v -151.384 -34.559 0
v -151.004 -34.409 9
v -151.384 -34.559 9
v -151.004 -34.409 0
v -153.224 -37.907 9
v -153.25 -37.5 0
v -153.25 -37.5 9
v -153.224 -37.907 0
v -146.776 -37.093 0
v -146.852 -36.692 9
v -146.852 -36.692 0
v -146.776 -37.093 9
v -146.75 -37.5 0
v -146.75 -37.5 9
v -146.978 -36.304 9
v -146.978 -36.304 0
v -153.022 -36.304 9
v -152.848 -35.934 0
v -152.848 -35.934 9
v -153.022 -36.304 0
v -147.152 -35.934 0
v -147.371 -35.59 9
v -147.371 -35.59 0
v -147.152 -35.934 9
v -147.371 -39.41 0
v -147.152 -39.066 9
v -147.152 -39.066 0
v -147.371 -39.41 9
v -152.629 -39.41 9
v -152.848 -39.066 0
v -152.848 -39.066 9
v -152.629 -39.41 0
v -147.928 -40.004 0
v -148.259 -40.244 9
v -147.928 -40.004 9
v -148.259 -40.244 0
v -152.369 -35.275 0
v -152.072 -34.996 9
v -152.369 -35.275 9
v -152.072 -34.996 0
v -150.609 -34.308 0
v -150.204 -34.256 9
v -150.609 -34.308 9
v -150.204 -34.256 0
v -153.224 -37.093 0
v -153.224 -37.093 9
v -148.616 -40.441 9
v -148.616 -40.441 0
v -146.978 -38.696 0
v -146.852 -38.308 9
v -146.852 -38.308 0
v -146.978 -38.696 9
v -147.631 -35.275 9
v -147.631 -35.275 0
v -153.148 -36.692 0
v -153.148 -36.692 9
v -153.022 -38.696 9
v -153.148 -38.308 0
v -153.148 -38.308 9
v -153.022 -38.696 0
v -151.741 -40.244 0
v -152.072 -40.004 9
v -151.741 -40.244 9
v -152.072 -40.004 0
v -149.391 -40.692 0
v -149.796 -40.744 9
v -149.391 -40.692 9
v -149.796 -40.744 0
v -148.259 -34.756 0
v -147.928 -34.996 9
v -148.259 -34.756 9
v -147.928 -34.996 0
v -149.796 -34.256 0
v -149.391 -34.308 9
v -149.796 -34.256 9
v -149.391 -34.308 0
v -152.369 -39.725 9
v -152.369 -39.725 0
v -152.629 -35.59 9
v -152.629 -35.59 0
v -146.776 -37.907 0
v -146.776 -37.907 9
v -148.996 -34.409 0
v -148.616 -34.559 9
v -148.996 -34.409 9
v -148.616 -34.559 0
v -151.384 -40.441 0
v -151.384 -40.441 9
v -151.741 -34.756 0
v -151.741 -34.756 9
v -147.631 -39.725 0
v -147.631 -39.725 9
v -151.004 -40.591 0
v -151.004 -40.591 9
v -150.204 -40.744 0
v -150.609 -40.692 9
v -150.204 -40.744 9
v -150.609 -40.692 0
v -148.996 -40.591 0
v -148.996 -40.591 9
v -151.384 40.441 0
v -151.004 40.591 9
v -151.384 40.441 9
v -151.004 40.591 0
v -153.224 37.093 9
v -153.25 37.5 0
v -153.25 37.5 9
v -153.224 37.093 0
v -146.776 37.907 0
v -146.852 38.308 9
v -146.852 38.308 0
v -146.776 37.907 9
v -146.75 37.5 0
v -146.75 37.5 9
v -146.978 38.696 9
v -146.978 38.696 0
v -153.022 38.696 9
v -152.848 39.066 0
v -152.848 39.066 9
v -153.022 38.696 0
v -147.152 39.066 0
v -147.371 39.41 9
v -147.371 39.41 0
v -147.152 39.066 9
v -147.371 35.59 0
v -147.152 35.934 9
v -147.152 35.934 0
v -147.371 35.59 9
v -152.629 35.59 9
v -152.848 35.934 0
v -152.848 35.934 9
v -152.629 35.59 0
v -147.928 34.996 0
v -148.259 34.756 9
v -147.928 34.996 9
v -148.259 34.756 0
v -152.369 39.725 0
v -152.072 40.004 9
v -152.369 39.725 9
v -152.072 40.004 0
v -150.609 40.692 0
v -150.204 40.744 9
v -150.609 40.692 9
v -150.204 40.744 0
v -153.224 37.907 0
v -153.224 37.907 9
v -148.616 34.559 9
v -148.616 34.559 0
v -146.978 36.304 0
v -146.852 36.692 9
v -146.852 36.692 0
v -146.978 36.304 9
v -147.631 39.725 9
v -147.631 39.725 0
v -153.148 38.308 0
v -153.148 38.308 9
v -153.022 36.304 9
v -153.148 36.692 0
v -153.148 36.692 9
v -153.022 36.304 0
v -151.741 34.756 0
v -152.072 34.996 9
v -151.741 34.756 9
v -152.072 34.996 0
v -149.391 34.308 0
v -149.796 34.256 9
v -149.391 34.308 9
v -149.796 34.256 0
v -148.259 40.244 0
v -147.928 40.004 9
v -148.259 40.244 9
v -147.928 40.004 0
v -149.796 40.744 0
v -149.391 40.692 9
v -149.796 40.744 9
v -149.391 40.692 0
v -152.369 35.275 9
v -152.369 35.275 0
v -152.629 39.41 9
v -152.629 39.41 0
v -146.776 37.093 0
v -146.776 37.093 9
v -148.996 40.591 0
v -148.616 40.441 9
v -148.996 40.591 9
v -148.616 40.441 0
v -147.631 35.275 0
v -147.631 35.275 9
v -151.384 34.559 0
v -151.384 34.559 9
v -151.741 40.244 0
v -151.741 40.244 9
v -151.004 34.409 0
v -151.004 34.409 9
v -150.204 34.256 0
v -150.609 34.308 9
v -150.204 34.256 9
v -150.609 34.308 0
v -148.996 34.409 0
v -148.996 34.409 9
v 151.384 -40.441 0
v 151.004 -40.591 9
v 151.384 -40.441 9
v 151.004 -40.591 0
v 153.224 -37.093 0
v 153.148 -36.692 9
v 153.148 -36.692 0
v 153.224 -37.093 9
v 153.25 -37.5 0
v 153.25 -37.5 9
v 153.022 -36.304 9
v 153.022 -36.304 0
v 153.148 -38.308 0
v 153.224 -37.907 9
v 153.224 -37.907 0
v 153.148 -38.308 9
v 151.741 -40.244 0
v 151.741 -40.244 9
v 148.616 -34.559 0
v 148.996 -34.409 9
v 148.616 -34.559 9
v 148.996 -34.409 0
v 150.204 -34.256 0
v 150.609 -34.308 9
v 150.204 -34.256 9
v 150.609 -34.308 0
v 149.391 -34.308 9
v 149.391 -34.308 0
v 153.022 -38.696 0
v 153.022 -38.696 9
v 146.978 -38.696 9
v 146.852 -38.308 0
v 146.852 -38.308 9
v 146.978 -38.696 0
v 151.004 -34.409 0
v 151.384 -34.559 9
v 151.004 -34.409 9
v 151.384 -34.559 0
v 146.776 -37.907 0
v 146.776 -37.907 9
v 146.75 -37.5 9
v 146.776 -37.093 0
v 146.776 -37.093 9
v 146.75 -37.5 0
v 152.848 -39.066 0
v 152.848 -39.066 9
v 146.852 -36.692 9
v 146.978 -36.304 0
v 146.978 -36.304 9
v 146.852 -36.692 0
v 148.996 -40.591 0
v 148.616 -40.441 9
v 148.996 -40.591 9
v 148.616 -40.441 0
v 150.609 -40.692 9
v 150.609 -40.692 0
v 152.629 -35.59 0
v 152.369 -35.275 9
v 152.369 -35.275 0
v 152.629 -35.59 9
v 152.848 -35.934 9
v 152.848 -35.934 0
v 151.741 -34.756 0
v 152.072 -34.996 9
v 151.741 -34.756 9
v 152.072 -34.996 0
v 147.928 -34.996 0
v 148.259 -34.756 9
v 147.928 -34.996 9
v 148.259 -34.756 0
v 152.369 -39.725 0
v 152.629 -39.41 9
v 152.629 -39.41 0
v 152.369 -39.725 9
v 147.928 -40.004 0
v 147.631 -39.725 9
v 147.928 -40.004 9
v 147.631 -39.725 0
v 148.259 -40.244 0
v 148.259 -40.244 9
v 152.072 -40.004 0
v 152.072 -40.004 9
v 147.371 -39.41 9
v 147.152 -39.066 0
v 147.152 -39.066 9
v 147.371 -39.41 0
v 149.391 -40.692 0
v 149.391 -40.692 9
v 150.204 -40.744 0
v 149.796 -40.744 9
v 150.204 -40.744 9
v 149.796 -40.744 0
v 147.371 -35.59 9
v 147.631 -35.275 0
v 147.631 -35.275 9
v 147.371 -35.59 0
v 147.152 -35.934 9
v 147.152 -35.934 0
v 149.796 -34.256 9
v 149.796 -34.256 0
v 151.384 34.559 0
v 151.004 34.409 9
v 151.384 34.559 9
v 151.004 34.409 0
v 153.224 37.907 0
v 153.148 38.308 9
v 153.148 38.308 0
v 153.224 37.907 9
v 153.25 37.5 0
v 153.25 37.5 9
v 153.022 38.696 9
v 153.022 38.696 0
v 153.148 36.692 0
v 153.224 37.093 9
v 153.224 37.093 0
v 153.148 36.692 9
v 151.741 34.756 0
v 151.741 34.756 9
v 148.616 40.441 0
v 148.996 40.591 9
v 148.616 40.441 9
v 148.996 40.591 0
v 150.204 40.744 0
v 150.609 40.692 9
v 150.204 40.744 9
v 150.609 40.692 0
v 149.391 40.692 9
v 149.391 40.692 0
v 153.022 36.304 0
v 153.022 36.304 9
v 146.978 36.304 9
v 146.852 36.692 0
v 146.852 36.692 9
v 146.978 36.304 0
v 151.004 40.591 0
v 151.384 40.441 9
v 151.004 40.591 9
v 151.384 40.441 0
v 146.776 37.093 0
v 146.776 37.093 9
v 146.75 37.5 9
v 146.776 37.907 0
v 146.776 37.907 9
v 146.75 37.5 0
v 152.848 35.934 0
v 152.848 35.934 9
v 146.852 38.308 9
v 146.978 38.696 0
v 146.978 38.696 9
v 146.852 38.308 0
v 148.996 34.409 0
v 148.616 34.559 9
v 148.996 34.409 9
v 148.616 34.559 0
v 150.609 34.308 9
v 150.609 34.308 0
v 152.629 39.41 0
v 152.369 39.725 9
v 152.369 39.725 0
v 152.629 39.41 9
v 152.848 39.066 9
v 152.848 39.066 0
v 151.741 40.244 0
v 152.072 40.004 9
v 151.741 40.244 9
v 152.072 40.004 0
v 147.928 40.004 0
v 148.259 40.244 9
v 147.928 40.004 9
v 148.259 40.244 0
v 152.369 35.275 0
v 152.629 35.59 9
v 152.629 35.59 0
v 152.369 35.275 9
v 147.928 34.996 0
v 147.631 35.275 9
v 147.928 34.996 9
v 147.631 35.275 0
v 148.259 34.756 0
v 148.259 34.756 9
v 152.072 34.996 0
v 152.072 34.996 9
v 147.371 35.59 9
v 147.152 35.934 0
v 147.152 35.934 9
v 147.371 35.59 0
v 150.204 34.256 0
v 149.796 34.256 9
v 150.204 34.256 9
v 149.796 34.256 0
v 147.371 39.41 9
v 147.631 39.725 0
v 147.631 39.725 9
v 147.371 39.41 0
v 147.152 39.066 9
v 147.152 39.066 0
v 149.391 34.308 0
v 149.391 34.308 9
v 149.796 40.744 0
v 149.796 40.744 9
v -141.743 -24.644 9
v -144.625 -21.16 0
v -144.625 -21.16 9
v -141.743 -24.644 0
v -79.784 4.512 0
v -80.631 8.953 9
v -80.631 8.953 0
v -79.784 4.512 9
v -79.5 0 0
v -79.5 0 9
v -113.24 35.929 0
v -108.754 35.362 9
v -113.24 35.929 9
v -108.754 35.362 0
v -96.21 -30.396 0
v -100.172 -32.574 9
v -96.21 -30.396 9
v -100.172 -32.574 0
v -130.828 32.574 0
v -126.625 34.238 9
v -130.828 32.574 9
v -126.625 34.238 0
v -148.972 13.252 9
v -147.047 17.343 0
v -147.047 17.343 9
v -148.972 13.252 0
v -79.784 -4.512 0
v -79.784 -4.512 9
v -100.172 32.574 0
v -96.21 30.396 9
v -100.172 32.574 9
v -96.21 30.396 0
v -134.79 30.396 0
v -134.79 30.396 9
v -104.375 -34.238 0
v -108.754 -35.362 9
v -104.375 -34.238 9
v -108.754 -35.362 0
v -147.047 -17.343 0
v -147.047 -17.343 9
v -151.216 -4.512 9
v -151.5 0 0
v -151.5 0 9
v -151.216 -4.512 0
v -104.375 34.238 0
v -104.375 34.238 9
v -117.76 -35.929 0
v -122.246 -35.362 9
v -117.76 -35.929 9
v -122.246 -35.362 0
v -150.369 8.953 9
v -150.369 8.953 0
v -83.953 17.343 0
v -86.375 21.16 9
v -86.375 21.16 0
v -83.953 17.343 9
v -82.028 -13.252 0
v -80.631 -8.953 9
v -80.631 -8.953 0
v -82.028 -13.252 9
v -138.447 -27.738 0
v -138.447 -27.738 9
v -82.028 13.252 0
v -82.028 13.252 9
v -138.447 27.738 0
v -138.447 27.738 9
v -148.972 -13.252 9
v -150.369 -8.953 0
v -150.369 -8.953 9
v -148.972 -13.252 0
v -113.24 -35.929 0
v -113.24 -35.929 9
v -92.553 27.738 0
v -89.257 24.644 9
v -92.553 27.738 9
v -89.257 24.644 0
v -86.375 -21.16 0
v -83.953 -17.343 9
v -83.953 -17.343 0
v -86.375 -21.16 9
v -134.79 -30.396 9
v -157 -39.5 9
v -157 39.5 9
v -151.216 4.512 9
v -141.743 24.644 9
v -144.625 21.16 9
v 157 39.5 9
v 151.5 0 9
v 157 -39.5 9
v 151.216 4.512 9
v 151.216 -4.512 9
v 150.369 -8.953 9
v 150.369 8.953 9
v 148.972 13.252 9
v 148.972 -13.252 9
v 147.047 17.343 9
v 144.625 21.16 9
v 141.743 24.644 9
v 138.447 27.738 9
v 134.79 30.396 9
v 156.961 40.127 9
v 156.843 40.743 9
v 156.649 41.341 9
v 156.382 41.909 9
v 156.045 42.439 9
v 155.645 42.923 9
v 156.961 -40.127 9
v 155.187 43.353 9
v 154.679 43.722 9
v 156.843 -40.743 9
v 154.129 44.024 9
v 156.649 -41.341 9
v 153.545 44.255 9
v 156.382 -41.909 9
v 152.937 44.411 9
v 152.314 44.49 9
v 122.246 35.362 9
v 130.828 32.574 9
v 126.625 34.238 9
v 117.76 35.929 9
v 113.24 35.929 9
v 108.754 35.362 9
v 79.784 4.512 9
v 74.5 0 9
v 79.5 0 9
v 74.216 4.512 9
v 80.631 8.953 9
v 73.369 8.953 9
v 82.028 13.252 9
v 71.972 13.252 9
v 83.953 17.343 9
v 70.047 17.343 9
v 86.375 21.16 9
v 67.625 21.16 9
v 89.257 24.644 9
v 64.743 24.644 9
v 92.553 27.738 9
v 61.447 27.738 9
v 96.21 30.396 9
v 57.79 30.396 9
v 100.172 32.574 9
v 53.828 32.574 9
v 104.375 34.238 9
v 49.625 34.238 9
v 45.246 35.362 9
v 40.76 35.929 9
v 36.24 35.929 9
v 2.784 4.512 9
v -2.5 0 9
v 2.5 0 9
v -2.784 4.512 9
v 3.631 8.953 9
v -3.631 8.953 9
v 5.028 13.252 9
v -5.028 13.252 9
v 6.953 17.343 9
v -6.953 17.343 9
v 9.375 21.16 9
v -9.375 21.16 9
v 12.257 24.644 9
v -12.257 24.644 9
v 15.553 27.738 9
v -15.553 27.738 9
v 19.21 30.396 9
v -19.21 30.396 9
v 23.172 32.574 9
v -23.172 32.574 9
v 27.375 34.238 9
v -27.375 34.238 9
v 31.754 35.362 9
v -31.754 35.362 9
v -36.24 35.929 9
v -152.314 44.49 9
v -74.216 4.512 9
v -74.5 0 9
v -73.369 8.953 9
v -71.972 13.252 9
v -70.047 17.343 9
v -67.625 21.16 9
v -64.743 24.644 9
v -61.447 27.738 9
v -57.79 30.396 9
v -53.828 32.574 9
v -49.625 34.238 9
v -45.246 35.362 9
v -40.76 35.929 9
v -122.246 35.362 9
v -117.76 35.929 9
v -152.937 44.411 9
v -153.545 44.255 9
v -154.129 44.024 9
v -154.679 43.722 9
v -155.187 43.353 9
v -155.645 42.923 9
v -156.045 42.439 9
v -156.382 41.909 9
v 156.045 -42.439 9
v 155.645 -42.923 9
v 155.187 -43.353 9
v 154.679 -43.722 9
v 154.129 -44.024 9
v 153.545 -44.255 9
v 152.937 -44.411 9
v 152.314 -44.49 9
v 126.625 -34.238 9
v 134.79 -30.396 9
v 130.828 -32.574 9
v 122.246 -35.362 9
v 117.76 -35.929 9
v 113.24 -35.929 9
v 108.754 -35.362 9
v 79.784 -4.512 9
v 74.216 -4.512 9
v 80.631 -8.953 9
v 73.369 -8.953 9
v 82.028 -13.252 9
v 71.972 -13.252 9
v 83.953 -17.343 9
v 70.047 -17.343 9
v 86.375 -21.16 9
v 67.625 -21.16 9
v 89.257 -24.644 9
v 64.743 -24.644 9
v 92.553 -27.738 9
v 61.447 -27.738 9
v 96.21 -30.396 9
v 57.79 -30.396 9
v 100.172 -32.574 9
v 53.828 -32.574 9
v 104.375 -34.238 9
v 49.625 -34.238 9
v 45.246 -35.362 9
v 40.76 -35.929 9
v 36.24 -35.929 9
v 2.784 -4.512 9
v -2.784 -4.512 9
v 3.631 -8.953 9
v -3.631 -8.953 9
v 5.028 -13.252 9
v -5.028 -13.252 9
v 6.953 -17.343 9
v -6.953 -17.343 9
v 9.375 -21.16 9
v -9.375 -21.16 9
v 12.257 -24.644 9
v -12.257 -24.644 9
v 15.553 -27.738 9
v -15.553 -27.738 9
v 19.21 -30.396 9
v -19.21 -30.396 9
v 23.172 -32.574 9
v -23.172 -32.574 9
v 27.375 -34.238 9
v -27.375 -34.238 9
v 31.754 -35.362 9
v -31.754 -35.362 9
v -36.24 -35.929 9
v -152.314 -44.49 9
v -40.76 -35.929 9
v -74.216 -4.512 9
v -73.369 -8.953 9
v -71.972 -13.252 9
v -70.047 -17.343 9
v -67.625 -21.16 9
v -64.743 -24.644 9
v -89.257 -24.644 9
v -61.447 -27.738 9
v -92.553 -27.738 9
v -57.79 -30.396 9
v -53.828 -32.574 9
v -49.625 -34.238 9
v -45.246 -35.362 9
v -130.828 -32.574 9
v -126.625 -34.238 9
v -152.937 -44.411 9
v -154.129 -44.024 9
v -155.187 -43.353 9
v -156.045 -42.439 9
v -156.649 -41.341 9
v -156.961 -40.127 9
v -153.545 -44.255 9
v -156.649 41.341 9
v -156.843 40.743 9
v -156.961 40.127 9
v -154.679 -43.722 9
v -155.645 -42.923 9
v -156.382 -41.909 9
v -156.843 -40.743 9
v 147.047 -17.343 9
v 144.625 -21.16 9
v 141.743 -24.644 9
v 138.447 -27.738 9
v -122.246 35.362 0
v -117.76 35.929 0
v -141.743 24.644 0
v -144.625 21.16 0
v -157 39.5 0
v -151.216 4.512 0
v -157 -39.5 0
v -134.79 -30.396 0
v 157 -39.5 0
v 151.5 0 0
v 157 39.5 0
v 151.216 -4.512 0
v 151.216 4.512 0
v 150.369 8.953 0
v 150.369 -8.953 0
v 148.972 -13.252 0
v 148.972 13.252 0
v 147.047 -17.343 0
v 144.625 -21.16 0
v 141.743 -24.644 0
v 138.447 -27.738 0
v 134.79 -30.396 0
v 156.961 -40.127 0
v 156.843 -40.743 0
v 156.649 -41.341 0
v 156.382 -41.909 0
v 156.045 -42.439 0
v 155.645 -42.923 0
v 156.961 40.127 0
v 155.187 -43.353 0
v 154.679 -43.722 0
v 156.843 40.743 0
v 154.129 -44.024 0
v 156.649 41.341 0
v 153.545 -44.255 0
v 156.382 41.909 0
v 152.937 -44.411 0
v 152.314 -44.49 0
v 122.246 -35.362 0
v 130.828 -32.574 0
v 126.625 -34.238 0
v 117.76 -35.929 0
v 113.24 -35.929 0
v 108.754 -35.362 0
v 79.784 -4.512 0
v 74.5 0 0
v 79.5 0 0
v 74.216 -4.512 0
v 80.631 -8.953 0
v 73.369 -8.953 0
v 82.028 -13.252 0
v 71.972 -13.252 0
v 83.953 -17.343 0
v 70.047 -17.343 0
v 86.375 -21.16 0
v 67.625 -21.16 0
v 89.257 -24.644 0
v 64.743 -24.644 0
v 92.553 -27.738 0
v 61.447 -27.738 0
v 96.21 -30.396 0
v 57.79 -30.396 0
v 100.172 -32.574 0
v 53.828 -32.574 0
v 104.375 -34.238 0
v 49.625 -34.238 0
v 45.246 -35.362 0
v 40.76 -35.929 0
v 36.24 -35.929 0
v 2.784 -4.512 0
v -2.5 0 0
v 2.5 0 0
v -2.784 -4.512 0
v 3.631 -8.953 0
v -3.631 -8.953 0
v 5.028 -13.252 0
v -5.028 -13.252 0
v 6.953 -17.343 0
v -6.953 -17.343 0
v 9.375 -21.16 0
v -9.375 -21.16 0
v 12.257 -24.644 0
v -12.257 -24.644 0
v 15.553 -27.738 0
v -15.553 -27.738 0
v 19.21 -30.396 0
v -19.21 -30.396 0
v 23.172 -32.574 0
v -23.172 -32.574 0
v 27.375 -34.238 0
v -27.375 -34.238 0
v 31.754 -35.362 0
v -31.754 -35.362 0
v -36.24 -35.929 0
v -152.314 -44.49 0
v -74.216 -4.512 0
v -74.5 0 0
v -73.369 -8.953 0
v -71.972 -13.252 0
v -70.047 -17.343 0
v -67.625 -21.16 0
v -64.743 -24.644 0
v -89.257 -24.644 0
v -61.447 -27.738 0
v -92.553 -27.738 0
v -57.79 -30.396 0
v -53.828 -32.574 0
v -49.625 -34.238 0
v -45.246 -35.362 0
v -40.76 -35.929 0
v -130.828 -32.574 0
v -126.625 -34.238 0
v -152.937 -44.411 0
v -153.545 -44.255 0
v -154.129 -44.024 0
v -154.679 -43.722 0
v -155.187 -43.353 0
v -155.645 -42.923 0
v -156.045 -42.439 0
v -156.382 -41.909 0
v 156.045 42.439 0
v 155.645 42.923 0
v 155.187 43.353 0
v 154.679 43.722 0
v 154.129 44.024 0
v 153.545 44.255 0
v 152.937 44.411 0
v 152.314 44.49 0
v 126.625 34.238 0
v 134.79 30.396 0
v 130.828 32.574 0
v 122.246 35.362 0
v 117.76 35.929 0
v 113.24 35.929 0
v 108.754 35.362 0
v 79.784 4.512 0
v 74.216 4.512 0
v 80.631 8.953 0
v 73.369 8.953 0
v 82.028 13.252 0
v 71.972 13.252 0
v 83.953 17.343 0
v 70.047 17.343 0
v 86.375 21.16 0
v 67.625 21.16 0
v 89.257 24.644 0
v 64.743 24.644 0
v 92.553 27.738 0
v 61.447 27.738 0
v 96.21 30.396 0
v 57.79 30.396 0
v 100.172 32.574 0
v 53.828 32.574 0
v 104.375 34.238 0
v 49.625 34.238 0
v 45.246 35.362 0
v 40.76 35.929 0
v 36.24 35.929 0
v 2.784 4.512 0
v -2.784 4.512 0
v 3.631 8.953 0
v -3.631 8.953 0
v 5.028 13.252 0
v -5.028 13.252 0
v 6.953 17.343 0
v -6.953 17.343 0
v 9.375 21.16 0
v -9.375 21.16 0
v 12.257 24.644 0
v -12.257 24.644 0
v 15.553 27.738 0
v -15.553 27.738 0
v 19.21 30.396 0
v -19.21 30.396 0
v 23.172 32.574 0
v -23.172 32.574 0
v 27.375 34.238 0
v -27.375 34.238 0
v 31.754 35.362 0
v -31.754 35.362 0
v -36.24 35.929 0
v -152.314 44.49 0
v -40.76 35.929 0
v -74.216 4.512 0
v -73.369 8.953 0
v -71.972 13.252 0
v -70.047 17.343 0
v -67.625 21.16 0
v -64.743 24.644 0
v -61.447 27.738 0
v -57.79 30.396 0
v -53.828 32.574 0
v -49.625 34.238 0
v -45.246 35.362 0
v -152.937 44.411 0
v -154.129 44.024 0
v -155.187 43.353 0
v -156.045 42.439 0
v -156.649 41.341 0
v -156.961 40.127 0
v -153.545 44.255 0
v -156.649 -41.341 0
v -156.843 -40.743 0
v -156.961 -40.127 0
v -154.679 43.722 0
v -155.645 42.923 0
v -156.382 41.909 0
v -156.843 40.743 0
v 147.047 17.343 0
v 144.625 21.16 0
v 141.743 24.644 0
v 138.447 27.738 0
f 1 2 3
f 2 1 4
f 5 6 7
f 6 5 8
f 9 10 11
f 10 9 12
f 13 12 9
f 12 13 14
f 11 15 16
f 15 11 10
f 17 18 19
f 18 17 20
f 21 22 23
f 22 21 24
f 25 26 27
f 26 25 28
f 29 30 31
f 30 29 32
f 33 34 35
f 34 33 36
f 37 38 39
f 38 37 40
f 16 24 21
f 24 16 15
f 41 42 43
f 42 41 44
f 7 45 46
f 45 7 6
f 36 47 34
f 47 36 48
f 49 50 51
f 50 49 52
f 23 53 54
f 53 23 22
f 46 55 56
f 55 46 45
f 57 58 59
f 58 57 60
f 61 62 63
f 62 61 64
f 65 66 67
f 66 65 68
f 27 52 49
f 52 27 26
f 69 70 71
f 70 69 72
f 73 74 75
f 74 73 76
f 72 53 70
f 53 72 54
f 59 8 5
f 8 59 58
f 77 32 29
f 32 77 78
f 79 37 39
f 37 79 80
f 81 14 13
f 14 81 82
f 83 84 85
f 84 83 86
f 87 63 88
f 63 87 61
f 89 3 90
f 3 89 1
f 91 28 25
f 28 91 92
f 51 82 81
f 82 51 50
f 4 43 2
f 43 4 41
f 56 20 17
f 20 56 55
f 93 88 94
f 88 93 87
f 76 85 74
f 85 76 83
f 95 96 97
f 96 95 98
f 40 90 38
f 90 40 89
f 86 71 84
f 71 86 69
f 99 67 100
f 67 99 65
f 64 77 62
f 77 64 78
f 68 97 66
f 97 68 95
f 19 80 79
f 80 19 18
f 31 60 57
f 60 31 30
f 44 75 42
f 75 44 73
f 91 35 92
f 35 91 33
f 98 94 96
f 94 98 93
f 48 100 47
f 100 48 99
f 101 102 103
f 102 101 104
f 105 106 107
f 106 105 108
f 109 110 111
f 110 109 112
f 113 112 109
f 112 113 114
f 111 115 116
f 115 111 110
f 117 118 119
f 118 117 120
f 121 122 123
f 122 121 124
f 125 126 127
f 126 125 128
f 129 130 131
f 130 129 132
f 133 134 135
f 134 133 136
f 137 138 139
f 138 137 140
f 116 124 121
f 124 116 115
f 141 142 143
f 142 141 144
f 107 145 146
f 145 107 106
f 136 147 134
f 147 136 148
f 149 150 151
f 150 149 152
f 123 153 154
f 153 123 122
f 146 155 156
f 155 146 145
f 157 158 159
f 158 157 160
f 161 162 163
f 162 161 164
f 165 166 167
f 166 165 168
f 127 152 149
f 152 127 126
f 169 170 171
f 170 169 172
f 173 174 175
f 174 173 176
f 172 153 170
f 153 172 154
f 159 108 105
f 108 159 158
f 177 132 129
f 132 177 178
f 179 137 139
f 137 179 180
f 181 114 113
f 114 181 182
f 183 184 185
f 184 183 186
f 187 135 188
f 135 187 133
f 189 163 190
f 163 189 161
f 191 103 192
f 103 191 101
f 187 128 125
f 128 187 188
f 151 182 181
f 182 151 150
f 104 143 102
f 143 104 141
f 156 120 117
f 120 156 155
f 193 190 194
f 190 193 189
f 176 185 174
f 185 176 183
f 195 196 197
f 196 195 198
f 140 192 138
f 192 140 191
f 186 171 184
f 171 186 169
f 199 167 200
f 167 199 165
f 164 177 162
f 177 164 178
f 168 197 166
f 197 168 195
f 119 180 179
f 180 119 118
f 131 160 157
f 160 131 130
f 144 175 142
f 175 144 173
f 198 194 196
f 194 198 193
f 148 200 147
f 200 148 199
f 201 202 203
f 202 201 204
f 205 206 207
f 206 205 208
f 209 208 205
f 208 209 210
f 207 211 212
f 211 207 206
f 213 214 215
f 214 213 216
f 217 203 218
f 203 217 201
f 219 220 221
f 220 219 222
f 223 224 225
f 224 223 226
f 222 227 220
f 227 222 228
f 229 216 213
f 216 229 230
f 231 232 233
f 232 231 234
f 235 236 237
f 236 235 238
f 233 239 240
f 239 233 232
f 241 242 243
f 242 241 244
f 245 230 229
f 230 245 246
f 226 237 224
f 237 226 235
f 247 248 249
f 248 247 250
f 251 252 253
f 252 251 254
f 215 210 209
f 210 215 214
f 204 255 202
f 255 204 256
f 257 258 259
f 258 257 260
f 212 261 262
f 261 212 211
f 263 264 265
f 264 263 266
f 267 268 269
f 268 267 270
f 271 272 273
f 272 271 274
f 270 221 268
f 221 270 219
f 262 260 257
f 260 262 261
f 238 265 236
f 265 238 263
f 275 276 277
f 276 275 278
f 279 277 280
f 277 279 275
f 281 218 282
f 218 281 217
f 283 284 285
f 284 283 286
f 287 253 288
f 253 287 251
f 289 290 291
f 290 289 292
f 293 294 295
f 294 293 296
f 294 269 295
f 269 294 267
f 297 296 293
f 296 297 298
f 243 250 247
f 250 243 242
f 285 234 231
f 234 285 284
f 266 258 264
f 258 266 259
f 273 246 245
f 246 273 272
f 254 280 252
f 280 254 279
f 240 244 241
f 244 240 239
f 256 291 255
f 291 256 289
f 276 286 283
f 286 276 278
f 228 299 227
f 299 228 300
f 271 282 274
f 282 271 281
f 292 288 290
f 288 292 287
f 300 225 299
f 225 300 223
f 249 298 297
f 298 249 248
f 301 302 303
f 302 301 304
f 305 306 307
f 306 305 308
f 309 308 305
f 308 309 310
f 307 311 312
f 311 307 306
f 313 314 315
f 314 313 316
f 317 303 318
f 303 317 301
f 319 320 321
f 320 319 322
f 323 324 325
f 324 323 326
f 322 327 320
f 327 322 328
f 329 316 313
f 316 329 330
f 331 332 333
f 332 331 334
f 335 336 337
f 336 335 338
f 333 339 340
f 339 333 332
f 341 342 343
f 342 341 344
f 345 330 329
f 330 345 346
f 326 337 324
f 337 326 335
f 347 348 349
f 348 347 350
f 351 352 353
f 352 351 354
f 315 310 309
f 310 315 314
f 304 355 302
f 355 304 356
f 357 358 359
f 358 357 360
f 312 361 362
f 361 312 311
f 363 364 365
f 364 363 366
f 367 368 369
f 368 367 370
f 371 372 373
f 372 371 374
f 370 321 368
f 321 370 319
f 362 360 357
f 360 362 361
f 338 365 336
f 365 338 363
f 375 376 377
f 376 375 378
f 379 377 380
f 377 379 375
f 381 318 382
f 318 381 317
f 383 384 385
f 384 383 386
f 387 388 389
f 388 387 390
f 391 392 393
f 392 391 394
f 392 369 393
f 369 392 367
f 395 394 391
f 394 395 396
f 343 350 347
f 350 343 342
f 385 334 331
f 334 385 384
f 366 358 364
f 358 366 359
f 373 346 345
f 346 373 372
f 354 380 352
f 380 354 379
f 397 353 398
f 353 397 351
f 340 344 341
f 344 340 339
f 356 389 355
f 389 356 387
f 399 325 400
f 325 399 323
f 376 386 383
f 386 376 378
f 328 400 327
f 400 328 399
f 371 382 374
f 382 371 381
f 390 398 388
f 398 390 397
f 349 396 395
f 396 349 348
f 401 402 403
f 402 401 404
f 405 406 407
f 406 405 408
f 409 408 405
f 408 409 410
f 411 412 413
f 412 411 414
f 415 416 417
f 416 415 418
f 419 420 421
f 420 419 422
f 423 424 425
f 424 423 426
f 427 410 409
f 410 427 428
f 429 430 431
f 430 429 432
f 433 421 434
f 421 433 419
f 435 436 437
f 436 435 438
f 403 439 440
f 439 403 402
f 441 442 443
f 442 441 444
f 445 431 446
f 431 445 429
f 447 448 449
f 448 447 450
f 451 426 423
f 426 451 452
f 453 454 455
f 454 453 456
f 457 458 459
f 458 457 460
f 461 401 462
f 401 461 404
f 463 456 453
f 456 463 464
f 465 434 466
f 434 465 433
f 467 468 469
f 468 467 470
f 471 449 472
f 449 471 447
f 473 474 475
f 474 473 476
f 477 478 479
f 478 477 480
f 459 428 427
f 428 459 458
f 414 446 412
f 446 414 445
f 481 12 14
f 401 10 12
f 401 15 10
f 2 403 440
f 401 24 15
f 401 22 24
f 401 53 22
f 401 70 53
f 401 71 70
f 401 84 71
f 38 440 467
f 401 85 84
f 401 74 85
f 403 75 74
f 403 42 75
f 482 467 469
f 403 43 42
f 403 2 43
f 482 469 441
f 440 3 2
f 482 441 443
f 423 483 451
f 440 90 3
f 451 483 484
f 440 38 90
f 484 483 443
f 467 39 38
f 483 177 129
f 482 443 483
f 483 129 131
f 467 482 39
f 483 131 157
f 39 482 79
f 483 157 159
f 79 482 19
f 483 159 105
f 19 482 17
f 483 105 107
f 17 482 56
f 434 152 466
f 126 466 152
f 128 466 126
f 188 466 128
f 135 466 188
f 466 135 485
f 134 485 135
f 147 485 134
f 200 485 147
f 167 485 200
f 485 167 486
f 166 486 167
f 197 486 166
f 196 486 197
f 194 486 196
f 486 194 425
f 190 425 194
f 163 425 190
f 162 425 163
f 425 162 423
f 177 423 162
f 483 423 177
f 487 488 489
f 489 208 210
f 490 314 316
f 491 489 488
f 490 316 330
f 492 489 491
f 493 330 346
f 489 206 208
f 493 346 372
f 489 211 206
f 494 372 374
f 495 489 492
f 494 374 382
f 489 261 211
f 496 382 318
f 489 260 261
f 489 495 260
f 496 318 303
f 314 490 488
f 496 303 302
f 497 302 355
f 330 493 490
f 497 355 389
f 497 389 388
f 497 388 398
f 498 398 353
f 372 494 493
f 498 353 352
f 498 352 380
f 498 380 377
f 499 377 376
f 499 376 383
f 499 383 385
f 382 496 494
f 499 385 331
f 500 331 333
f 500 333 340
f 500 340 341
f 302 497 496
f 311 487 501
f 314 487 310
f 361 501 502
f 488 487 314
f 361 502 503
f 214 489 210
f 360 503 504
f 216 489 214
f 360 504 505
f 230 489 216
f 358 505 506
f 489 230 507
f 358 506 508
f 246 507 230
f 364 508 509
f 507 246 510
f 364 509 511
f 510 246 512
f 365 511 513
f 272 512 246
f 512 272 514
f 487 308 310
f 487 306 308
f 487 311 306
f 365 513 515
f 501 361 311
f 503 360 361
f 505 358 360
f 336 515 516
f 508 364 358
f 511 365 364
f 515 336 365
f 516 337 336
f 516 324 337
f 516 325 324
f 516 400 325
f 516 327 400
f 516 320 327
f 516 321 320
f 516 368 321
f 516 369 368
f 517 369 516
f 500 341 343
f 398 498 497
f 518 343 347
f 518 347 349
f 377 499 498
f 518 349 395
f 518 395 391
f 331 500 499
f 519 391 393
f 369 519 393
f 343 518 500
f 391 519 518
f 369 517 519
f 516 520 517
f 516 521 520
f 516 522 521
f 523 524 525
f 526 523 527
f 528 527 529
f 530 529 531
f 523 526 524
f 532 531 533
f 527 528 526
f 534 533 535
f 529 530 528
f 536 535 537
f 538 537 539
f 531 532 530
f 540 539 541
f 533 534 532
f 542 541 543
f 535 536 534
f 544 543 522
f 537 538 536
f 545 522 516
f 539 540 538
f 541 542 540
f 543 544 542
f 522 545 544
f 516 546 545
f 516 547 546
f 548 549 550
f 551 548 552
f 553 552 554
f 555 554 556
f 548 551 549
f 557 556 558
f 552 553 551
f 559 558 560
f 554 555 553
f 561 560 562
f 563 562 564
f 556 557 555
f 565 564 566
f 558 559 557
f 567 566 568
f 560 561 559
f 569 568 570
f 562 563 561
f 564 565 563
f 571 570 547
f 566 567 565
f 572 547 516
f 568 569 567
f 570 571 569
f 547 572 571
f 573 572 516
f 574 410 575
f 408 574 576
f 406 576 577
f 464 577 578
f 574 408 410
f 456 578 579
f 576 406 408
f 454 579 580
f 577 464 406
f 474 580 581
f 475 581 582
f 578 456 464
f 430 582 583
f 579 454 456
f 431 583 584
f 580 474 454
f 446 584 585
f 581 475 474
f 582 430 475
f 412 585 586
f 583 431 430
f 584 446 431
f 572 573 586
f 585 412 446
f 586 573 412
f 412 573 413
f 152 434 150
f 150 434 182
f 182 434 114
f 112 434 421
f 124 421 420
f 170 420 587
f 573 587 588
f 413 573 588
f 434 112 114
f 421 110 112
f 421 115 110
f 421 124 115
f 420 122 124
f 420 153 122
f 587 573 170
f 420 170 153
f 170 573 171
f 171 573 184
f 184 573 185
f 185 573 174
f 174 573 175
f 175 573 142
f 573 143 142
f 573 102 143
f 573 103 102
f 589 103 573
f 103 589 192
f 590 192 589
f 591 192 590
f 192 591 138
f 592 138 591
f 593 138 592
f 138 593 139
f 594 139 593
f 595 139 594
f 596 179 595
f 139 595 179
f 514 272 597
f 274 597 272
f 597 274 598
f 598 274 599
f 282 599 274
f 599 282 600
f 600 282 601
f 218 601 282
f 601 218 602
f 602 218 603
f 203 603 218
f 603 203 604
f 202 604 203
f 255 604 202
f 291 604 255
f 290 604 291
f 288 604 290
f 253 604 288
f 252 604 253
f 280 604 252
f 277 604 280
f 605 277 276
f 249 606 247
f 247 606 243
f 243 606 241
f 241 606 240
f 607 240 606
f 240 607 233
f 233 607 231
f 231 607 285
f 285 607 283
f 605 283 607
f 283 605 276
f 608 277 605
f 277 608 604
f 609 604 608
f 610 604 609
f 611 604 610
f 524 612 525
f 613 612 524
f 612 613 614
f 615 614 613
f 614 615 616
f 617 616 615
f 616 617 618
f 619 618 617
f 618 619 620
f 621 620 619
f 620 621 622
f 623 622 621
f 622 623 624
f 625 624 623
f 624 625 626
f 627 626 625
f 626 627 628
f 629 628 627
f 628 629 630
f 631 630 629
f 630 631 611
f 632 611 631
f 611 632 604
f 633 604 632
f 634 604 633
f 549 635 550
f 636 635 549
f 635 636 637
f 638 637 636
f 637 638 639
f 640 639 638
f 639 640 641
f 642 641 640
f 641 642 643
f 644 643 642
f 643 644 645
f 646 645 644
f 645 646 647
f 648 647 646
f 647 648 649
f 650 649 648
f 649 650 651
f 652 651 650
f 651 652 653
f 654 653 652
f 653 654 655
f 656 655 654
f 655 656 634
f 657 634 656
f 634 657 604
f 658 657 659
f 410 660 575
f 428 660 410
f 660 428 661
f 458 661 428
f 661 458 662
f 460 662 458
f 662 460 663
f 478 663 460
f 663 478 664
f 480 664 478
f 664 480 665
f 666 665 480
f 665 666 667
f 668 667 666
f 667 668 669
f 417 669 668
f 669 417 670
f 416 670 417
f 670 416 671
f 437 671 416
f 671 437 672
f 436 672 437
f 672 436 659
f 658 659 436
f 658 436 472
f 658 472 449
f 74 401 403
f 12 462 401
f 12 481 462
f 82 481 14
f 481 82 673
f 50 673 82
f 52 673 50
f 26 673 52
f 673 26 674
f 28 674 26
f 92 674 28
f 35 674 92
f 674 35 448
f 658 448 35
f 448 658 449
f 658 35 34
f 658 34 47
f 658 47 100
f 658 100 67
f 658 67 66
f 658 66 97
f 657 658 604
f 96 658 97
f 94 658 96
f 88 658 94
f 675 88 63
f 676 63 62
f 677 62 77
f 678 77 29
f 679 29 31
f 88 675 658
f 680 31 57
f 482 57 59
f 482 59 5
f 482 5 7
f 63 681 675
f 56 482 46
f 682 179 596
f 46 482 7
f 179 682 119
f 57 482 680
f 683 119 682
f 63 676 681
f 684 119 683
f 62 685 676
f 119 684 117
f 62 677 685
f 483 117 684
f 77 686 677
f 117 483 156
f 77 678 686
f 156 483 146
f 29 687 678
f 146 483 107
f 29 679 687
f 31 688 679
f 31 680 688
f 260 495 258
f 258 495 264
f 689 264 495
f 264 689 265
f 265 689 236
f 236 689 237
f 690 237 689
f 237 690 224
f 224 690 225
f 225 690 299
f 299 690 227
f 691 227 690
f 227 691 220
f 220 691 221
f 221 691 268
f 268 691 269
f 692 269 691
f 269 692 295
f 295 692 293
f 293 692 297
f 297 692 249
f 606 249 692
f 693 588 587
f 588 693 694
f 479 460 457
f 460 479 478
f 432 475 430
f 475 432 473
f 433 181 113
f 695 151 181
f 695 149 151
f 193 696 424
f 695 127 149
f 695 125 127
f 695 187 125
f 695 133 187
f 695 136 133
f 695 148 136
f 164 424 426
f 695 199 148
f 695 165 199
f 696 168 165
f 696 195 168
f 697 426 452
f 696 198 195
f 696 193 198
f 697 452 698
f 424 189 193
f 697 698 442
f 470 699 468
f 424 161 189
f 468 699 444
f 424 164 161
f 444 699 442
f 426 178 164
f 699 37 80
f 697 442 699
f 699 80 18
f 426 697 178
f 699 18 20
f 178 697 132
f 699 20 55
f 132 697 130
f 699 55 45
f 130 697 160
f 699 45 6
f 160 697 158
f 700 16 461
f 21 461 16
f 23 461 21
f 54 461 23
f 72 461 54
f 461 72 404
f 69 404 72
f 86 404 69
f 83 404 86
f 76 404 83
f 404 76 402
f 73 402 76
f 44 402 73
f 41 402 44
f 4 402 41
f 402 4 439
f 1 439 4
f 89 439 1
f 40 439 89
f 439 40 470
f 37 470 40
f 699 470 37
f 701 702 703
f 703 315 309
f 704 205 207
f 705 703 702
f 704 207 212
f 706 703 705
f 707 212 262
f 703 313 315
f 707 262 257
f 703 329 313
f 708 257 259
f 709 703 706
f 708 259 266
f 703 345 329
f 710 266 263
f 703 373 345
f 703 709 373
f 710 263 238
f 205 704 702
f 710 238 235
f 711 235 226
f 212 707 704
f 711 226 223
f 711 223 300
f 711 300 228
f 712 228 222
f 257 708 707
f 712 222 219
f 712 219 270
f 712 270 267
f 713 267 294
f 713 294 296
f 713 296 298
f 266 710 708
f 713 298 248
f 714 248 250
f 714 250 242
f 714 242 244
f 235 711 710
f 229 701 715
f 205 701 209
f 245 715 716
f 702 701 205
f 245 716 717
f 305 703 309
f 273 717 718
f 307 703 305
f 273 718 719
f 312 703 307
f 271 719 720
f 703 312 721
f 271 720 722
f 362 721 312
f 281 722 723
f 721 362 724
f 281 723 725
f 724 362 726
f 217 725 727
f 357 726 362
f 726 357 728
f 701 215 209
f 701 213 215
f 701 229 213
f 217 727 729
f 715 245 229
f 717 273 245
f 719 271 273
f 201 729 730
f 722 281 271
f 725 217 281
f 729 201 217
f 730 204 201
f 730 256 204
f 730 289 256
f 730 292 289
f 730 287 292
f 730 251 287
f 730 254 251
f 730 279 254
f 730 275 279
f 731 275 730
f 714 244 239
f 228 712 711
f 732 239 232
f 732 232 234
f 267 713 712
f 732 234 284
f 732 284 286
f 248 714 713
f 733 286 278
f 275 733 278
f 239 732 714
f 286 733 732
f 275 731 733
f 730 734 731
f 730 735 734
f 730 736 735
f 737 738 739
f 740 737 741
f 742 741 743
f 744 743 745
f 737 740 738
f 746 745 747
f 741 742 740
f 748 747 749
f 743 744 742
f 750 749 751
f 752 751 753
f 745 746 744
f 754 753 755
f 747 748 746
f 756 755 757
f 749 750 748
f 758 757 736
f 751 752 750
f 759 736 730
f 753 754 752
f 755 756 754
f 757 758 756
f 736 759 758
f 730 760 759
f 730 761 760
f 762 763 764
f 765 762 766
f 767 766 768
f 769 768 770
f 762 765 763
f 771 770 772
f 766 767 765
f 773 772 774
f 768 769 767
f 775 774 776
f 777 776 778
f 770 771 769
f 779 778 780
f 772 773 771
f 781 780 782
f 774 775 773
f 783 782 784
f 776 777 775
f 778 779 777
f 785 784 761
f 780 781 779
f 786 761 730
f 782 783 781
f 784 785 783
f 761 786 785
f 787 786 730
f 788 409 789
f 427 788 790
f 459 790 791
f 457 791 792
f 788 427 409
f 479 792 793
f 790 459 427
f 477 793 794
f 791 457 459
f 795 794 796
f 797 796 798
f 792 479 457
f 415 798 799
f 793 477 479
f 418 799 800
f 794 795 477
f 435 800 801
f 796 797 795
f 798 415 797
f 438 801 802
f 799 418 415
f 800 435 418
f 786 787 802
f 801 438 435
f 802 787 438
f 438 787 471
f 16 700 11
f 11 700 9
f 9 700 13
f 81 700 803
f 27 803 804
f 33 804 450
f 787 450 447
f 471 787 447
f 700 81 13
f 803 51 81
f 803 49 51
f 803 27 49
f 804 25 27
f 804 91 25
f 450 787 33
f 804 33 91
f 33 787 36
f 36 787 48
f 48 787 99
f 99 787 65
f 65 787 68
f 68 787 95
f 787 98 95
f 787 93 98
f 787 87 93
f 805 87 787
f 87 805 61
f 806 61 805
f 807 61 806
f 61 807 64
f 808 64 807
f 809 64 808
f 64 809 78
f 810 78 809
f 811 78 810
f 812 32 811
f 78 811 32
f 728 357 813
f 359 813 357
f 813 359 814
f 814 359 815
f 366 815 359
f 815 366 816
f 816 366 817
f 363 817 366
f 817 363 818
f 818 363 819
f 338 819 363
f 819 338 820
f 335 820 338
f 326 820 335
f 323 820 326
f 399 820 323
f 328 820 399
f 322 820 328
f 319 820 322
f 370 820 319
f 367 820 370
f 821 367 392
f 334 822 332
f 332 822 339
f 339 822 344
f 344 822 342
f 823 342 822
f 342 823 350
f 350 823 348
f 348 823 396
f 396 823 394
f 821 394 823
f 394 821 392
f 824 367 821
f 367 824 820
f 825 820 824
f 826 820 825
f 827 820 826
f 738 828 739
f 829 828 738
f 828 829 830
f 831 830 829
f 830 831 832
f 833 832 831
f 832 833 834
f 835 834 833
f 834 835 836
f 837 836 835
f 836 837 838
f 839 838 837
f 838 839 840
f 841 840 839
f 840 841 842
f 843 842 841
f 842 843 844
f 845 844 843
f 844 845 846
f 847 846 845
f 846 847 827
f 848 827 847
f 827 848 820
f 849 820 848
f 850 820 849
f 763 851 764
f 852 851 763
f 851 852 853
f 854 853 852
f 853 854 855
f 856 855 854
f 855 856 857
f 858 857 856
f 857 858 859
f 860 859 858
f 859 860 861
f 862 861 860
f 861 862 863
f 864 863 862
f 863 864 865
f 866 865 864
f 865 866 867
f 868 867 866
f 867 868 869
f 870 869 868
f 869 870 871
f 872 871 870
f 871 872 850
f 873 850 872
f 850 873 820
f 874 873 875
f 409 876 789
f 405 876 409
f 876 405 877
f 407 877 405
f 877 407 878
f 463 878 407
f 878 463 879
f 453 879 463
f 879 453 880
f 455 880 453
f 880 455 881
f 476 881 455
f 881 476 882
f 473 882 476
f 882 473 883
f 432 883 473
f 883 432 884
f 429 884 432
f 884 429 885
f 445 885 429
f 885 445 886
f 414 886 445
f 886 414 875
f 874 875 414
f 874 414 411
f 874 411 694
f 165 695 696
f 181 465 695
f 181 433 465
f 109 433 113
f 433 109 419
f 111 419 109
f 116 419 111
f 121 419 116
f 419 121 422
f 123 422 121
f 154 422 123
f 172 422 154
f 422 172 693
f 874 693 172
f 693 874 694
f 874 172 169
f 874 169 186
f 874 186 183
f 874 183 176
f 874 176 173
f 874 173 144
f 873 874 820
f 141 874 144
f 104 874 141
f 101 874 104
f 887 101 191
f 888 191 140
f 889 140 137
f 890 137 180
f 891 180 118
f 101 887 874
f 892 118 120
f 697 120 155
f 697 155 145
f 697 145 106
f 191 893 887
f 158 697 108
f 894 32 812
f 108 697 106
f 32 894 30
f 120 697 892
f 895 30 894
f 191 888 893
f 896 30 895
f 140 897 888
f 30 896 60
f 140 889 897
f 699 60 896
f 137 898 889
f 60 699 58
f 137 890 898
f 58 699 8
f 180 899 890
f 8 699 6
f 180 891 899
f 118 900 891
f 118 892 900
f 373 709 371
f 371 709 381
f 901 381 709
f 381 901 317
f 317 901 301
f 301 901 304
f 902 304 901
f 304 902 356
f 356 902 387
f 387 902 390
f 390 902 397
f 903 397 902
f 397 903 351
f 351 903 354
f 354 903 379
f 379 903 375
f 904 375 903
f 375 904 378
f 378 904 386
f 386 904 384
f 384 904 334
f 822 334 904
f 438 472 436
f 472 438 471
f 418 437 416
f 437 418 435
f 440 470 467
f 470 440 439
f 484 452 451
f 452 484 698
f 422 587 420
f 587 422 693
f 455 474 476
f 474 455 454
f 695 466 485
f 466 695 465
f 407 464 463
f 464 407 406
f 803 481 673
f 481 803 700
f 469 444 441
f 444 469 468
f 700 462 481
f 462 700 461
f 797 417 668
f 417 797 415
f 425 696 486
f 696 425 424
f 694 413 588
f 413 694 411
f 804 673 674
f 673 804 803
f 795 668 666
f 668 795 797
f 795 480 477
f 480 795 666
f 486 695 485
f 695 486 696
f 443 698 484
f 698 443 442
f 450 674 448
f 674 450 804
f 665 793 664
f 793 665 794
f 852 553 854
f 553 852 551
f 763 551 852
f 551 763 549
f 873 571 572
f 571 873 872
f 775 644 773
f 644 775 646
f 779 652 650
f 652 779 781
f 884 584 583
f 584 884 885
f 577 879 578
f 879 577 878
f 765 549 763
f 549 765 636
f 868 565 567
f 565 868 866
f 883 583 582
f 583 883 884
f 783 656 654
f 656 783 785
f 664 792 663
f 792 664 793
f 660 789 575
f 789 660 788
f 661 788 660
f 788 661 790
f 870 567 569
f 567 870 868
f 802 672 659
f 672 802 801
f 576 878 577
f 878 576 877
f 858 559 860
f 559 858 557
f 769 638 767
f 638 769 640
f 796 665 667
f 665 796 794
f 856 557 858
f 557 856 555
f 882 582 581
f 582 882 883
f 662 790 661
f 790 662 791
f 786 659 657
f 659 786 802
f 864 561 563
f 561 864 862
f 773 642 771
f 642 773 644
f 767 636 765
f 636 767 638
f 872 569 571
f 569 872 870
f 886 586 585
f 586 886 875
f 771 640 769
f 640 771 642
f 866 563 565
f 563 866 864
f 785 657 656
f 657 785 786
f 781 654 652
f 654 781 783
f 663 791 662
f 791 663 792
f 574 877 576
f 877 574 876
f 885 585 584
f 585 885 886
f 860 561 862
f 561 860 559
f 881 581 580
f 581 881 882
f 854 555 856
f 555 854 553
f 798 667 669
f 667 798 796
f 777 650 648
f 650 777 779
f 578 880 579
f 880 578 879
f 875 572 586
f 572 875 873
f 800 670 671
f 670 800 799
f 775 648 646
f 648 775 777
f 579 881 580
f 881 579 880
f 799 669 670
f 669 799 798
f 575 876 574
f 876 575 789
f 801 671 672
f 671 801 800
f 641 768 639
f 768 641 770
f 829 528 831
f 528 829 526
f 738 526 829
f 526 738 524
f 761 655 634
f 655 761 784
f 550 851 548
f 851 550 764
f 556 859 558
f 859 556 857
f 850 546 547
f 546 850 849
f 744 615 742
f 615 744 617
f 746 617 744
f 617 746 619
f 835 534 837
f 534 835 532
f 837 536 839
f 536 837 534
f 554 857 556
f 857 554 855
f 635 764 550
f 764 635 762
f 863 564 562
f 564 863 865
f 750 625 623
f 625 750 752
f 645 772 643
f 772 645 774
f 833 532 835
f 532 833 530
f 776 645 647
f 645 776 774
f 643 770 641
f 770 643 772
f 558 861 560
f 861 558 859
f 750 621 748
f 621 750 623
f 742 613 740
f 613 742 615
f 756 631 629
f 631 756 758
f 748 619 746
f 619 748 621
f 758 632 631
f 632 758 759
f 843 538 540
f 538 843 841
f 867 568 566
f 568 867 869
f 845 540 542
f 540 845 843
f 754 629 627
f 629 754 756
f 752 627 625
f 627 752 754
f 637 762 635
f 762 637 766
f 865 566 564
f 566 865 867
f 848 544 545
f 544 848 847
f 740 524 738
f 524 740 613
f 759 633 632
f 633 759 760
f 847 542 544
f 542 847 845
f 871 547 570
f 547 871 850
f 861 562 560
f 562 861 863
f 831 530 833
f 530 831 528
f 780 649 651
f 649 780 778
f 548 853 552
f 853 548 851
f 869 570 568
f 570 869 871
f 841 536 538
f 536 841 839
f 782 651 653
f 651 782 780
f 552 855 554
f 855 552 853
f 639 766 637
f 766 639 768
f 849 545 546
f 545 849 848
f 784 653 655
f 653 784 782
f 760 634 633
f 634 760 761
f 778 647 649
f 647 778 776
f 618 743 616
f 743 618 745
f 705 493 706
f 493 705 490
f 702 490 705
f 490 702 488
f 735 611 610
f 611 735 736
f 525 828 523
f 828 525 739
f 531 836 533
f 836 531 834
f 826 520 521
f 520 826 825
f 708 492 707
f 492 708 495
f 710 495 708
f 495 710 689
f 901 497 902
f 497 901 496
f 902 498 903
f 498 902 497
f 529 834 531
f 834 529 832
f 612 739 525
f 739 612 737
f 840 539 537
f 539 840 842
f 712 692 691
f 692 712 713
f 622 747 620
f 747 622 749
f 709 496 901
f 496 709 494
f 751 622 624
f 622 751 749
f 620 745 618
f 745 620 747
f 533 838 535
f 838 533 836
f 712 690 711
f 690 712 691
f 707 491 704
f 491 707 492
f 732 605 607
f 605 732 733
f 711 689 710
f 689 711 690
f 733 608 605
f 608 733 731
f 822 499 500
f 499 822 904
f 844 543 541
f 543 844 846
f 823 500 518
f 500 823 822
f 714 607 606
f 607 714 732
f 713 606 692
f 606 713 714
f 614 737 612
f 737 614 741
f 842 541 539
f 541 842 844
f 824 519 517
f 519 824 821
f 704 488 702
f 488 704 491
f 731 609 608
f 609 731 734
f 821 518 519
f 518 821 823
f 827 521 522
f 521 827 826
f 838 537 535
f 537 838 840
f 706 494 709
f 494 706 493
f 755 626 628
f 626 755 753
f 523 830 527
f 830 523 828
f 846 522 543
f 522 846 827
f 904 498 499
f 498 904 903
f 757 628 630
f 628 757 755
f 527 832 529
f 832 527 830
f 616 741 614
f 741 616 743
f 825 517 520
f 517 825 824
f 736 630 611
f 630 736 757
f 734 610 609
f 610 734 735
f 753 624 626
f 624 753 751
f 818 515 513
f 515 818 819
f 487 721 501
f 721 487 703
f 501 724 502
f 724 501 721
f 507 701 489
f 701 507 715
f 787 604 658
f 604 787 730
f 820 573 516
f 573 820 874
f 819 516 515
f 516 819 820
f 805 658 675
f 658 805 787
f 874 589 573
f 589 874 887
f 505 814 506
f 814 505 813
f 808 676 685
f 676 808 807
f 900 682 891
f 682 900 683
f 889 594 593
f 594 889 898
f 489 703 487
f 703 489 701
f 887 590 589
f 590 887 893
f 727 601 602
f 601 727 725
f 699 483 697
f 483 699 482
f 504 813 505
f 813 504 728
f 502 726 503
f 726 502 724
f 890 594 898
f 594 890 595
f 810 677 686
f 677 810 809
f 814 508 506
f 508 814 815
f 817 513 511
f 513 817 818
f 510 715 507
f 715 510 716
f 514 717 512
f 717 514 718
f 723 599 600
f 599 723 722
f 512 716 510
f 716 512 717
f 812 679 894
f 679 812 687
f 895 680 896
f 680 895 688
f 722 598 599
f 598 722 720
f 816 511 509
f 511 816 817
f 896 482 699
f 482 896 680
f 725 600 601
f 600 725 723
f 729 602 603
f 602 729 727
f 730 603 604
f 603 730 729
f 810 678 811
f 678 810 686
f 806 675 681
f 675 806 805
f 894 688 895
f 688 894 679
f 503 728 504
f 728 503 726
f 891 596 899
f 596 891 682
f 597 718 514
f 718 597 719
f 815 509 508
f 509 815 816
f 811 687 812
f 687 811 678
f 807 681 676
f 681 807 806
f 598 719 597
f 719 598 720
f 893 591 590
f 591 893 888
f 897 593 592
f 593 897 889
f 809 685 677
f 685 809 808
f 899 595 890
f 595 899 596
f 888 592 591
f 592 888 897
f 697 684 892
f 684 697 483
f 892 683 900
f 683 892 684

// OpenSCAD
$fn = 50;


difference() {
	union() {
		hull() {
			translate(v = [-152.0000000000, 39.5000000000, 0]) {
				cylinder(h = 9, r = 5);
			}
			translate(v = [152.0000000000, 39.5000000000, 0]) {
				cylinder(h = 9, r = 5);
			}
			translate(v = [-152.0000000000, -39.5000000000, 0]) {
				cylinder(h = 9, r = 5);
			}
			translate(v = [152.0000000000, -39.5000000000, 0]) {
				cylinder(h = 9, r = 5);
			}
		}
	}
	union() {
		#translate(v = [-150.0000000000, -37.5000000000, -100.0000000000]) {
			cylinder(h = 200, r = 3.2500000000);
		}
		#translate(v = [-150.0000000000, 37.5000000000, -100.0000000000]) {
			cylinder(h = 200, r = 3.2500000000);
		}
		#translate(v = [150.0000000000, -37.5000000000, -100.0000000000]) {
			cylinder(h = 200, r = 3.2500000000);
		}
		#translate(v = [150.0000000000, 37.5000000000, -100.0000000000]) {
			cylinder(h = 200, r = 3.2500000000);
		}
		#translate(v = [-115.5000000000, 0, 0]) {
			cylinder(h = 9, r = 36.0000000000);
		}
		#translate(v = [-38.5000000000, 0, 0]) {
			cylinder(h = 9, r = 36.0000000000);
		}
		#translate(v = [38.5000000000, 0, 0]) {
			cylinder(h = 9, r = 36.0000000000);
		}
		#translate(v = [115.5000000000, 0, 0]) {
			cylinder(h = 9, r = 36.0000000000);
		}
	}
}
